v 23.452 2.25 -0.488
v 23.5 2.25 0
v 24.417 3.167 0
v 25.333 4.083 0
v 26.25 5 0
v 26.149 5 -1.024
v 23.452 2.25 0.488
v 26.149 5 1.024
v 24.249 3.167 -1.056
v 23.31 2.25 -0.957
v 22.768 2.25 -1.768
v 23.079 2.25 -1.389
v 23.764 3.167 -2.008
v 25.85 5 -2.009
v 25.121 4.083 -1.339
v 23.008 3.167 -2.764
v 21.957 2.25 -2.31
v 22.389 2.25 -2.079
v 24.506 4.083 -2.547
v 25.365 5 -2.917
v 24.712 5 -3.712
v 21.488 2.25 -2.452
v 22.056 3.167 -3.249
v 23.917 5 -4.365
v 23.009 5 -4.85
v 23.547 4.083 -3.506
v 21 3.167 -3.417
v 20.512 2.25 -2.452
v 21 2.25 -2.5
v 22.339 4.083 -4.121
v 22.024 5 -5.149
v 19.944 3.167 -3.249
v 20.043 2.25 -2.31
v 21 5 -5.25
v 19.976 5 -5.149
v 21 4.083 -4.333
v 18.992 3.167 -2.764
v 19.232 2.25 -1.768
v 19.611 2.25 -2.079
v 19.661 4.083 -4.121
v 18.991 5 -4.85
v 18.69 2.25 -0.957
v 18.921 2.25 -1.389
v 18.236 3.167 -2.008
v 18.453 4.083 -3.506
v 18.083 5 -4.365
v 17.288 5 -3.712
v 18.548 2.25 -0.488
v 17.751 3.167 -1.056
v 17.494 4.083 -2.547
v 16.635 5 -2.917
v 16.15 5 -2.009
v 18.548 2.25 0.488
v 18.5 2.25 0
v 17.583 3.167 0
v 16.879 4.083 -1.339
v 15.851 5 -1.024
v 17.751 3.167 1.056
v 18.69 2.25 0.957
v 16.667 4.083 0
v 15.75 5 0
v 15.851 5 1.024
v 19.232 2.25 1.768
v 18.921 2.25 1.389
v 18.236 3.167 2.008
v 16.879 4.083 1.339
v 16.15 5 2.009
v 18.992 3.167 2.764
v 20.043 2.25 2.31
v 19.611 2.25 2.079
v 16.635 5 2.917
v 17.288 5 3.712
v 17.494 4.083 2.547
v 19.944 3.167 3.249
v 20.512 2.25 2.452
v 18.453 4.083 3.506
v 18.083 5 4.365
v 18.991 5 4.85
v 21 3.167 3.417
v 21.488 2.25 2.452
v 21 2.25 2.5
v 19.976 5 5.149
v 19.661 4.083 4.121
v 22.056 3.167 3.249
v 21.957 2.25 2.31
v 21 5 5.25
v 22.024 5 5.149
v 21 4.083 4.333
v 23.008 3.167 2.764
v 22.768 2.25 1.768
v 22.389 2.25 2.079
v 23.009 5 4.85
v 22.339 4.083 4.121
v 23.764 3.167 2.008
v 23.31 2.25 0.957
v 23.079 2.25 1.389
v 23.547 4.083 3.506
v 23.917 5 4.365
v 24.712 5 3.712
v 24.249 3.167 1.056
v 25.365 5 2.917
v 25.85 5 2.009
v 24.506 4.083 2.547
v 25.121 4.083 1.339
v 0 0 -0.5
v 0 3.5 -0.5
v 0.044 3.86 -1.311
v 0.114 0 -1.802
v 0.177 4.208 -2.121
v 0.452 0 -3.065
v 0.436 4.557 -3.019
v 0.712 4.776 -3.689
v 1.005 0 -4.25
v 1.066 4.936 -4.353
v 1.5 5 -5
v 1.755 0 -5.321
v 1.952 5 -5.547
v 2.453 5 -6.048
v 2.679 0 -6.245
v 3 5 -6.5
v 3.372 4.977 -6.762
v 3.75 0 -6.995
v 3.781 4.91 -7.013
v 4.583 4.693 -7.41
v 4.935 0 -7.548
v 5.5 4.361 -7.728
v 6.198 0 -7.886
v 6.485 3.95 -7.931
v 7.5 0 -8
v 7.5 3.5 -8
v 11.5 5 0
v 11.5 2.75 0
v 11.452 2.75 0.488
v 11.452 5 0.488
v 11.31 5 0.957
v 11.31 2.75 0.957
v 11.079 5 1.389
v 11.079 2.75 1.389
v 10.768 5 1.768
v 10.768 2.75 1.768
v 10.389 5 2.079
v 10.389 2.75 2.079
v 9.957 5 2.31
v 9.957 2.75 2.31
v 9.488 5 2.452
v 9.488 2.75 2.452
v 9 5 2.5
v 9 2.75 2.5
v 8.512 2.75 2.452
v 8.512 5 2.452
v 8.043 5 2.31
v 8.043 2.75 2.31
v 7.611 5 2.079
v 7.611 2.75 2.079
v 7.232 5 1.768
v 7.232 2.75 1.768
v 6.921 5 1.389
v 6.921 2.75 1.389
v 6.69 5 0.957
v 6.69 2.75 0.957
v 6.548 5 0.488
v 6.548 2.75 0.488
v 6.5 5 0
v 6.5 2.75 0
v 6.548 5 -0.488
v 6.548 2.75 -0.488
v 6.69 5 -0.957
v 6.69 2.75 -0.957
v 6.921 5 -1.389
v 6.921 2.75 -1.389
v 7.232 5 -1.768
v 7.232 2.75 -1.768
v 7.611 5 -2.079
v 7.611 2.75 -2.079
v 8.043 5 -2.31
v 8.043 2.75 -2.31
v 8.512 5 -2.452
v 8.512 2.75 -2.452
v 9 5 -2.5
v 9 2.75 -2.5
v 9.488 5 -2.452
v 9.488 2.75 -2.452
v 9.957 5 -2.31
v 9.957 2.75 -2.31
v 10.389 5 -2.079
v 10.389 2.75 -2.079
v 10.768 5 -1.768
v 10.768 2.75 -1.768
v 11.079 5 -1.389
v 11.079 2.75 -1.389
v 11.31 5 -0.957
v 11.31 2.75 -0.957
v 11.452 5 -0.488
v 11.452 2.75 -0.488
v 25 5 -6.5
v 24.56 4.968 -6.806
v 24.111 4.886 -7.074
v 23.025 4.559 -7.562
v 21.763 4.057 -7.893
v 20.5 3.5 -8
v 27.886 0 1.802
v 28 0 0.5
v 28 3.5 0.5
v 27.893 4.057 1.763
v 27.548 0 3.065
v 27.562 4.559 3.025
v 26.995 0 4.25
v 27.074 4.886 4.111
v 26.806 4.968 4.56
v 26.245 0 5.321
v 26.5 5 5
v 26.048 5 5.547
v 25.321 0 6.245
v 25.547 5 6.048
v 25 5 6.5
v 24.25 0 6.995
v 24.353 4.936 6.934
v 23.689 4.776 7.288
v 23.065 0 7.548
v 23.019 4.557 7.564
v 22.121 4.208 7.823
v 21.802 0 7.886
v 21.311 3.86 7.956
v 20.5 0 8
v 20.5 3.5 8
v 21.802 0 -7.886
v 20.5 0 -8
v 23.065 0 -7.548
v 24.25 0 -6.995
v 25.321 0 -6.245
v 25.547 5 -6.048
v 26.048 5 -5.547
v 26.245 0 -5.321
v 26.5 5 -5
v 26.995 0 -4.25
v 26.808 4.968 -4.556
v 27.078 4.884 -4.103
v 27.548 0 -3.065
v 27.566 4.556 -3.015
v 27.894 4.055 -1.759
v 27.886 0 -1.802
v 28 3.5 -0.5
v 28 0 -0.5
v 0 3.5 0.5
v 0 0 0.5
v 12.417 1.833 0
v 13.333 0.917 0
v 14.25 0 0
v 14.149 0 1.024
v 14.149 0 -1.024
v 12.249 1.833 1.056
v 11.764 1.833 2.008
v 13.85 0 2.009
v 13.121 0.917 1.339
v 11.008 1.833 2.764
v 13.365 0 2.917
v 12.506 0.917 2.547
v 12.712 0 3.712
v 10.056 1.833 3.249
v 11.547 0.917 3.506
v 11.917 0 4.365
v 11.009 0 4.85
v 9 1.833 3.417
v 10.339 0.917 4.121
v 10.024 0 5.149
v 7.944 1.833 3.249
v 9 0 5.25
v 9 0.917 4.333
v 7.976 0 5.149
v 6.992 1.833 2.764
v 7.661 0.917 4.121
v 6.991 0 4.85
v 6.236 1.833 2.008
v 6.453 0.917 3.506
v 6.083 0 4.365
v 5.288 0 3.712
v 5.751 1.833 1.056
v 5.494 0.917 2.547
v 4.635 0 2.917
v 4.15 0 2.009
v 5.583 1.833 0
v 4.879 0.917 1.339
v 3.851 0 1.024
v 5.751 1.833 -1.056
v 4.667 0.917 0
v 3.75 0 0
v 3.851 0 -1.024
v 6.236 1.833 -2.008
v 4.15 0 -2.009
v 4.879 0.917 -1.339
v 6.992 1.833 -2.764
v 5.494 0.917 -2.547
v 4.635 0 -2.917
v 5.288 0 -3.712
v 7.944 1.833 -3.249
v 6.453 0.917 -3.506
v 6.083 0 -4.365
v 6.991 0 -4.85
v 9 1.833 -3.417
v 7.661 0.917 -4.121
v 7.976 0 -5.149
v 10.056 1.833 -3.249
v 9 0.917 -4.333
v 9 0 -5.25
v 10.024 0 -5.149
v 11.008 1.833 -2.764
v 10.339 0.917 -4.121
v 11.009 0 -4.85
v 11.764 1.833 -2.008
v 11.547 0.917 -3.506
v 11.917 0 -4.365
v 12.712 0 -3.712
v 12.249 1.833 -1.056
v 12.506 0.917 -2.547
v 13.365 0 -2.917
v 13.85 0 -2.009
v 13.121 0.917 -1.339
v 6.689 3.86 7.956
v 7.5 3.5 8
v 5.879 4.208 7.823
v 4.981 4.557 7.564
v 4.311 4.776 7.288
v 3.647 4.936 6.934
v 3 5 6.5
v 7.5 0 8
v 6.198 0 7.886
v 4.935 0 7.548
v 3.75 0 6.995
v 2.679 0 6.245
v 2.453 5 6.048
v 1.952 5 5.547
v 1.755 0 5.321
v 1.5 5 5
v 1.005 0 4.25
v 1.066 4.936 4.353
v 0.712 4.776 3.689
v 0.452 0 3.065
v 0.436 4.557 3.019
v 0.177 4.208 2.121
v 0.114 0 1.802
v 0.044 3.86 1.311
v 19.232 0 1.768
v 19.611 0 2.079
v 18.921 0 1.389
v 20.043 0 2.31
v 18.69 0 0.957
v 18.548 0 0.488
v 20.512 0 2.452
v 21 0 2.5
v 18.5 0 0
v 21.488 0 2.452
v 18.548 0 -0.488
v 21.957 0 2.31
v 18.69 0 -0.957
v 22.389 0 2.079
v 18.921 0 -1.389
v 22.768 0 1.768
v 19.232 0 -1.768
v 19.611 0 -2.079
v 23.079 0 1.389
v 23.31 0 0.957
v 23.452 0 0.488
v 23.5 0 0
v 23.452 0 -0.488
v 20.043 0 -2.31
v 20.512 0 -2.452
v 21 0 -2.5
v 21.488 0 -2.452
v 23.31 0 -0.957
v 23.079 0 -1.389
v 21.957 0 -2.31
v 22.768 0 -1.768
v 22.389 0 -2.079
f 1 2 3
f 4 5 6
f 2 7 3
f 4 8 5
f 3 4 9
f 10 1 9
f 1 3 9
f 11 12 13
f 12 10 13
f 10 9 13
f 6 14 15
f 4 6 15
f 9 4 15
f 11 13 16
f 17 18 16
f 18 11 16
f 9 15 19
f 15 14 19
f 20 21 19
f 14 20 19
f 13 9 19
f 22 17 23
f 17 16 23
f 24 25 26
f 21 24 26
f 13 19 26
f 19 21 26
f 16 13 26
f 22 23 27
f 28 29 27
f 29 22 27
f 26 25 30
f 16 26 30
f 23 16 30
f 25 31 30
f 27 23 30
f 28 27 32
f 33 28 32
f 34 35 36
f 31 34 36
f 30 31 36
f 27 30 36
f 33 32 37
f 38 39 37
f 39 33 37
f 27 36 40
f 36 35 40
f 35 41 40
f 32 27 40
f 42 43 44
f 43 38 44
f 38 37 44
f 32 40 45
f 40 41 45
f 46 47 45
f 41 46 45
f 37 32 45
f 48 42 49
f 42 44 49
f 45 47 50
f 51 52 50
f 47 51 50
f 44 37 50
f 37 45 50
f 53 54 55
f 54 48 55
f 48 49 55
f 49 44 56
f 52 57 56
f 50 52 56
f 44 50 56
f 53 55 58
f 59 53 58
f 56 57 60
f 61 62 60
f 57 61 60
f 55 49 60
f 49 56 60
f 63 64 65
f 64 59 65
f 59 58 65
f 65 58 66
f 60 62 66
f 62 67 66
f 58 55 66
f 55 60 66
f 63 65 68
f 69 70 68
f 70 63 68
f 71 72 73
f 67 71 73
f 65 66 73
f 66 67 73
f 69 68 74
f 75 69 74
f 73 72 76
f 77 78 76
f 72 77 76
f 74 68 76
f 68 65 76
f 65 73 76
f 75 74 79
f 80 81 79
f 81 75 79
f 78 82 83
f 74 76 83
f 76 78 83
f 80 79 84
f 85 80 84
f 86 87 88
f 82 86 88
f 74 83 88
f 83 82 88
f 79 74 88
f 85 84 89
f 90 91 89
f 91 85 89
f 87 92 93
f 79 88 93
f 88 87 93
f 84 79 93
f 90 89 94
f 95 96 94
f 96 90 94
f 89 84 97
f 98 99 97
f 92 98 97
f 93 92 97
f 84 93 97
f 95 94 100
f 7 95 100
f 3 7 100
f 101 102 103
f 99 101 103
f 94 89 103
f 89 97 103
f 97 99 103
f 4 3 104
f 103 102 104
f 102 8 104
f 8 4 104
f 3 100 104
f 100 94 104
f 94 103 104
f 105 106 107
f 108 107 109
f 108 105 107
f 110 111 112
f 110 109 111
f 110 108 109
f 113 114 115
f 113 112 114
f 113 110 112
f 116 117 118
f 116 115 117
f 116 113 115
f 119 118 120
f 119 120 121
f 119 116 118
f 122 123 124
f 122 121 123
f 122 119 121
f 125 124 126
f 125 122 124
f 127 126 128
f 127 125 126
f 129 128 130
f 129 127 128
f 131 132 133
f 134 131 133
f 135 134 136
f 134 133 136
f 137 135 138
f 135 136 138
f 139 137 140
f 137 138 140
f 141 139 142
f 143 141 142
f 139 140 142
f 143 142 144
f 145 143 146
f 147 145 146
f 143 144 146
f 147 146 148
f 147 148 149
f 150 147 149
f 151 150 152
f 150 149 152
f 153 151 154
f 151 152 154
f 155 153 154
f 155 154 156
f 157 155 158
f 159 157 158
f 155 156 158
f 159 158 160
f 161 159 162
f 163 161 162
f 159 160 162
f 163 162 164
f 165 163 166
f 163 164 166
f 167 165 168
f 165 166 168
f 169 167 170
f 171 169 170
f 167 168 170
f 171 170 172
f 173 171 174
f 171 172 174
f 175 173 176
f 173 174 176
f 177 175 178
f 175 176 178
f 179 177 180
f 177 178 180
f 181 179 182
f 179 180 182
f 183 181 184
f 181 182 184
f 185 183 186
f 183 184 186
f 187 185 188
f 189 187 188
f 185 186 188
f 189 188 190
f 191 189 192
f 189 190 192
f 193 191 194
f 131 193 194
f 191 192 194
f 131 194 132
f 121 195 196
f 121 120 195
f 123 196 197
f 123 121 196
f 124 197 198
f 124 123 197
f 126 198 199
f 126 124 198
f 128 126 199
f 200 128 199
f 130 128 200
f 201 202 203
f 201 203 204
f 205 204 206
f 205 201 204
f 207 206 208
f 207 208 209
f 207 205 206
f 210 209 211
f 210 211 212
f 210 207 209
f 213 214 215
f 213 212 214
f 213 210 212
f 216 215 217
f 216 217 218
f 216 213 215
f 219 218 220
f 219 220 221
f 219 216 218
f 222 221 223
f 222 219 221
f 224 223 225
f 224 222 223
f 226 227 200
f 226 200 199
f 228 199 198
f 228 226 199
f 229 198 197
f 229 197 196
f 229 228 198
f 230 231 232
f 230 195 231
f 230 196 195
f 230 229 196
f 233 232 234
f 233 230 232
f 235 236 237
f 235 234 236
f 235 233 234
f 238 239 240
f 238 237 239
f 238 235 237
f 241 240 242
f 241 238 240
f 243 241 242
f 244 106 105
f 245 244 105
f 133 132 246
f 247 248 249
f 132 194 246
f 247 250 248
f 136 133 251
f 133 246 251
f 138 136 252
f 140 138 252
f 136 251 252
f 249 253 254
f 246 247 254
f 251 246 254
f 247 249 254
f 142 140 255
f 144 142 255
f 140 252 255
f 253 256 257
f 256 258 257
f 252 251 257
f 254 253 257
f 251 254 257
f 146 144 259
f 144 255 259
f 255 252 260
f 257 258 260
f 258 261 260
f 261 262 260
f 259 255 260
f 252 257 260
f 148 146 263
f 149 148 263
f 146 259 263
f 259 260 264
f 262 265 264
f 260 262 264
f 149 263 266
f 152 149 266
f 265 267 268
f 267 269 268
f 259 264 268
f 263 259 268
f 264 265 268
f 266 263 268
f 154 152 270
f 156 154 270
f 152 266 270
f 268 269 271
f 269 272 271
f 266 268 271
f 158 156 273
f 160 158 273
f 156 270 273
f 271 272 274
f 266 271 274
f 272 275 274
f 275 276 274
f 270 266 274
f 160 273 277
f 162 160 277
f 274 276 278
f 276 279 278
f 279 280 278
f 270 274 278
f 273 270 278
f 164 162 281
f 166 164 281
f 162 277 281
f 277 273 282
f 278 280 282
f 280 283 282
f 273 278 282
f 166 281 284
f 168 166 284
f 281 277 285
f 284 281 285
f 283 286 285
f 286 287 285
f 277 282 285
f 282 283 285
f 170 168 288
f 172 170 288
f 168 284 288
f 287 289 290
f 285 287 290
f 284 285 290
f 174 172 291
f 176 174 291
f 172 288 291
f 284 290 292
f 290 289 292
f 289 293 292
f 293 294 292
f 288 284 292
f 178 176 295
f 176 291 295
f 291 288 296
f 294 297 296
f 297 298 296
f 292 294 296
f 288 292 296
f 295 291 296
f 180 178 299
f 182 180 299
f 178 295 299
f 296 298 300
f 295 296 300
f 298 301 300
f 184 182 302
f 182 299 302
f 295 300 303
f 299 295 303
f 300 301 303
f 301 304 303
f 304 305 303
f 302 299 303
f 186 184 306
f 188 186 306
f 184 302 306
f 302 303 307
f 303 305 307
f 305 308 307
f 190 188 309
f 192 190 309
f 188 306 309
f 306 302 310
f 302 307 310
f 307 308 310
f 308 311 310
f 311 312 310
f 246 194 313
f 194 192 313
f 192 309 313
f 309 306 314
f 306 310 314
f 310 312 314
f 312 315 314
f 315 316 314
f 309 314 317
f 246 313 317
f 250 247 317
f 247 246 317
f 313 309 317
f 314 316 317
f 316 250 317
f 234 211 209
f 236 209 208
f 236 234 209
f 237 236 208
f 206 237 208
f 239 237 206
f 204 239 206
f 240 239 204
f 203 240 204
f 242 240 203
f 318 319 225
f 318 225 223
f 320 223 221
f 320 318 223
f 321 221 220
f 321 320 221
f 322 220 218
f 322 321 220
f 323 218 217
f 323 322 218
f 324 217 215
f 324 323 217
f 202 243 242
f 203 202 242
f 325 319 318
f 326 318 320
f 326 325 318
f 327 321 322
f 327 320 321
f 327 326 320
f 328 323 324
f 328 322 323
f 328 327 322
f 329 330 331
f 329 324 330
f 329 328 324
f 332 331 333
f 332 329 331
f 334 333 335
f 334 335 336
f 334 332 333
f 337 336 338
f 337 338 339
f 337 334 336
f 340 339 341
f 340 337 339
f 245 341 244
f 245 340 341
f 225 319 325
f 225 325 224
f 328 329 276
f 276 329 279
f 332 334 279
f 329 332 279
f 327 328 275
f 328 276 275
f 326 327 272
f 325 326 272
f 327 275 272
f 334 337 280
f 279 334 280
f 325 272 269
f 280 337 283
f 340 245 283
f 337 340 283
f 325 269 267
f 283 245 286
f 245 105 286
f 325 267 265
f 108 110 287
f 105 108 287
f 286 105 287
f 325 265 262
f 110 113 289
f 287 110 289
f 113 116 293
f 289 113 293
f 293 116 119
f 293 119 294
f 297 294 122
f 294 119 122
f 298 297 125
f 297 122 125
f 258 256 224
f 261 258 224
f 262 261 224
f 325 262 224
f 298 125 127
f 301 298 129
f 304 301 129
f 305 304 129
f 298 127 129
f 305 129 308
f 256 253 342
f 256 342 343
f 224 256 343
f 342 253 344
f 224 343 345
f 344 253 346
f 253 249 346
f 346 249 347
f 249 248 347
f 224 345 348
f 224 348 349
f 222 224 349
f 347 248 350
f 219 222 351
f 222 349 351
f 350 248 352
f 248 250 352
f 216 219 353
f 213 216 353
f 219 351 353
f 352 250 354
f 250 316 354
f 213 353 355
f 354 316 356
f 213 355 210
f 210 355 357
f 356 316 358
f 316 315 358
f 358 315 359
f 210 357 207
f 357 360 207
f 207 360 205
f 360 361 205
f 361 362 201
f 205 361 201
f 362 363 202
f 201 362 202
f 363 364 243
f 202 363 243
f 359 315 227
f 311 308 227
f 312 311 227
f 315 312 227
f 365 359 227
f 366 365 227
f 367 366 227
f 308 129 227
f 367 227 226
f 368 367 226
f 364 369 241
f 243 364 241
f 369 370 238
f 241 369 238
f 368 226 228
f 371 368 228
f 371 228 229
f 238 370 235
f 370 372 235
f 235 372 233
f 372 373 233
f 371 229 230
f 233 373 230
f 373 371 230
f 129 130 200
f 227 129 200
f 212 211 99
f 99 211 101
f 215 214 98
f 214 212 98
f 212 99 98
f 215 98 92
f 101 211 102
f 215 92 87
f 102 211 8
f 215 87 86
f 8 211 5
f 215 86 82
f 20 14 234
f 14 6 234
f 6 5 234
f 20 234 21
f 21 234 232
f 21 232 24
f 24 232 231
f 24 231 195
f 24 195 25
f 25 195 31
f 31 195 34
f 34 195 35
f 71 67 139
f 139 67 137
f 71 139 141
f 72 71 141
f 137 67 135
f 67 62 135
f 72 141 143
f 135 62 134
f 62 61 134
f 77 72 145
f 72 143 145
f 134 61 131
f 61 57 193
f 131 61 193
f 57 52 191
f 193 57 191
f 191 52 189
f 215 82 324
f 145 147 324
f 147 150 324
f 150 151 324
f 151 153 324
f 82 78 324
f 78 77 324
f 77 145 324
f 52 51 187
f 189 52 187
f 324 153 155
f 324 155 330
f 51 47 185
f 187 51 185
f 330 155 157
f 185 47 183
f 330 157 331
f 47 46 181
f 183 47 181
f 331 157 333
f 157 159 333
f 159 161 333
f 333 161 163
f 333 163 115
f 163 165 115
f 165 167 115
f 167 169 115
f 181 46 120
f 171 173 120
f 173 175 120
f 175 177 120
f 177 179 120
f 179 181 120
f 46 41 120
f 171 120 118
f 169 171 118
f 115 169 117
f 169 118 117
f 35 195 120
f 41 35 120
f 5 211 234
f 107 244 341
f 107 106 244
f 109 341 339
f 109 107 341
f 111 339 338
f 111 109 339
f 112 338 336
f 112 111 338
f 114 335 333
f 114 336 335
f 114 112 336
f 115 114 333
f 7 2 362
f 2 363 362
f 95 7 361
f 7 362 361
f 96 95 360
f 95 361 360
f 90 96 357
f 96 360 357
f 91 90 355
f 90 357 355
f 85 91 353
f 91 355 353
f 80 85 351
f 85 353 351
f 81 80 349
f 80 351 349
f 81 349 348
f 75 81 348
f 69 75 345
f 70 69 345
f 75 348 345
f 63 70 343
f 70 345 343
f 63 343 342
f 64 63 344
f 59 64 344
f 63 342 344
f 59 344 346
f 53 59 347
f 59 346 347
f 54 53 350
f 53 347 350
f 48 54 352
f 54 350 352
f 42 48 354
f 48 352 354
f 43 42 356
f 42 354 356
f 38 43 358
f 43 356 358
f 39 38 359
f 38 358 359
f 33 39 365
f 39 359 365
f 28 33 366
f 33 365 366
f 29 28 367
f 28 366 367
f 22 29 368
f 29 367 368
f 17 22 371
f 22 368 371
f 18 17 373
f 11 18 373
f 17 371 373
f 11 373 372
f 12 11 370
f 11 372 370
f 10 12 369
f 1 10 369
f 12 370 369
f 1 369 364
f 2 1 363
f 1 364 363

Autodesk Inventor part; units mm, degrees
sketch "Sketch_1" plane through (0, 0, 0) normal (0, 0, 1) x (1, 0, 0)
  line L0 (0, 0) -> (28, 0)
  line L1 (28, 0) -> (28, 3.5)
  arc A0 (28, 3.5) -> (26.5, 5) centre (26.5, 3.5) ccw
  line L2 (26.5, 5) -> (1.5, 5)
  arc A1 (1.5, 5) -> (0, 3.5) centre (1.5, 3.5) ccw
  line L3 (0, 3.5) -> (0, 0)
extrude "Extrusion1" add sketch "Sketch_1" along normal mid plane 16
sketch "Sketch_2" plane through (0, 0, 0) normal (1, 0, 0) x (0, 1, 0)
  line L0 (14.3017, 20.7284) -> (-9.9569, 20.7284)
  line L1 (-9.9569, 20.7284) -> (-9.9569, -18.375)
  line L2 (-9.9569, -18.375) -> (14.3017, -18.375)
  line L3 (14.3017, -18.375) -> (14.3017, 20.7284)
  line L4 (0, 8) -> (0, -8)
  line L5 (0, -8) -> (3.5, -8)
  arc A0 (3.5, -8) -> (5, -6.5) centre (3.5, -6.5) ccw
  line L6 (5, -6.5) -> (5, 6.5)
  arc A1 (5, 6.5) -> (3.5, 8) centre (3.5, 6.5) ccw
  line L7 (3.5, 8) -> (0, 8)
extrude "Extrusion2" cut sketch "Sketch_2" along normal blind 28
sketch "Sketch_3" plane through (0, 0, 0) normal (0, 0, 1) x (1, 0, 0)
  line L0 (21, 0) -> (21, 5)
  line L1 (21, 5) -> (26.25, 5)
  line L2 (26.25, 5) -> (23.5, 2.25)
  line L3 (23.5, 2.25) -> (23.5, 0)
  line L4 (23.5, 0) -> (21, 0)
  line L5 (21, 0) -> (21, 5)
revolve "Revolution1" cut sketch "Sketch_3" angle 360 about axis through (21, 0, 0) along (0, -1, 0)
sketch "Sketch_4" plane through (0, 0, 0) normal (0, 0, 1) x (1, 0, 0)
  line L0 (9, 0) -> (9, 5)
  line L1 (9, 5) -> (11.5, 5)
  line L2 (11.5, 5) -> (11.5, 2.75)
  line L3 (11.5, 2.75) -> (14.25, 0)
  line L4 (14.25, 0) -> (9, 0)
  line L5 (9, 0) -> (9, 5)
revolve "Revolution2" cut sketch "Sketch_4" angle 360 about axis through (9, 0, 0) along (0, -1, 0)
sketch "Sketch_7" plane through (0, 0, 0) normal (0, 1, 0) x (-1, 0, 0)
  line L0 (14, -16) -> (14, 16)
  line L1 (14, 16) -> (-34, 16)
  line L2 (-34, 16) -> (-34, -16)
  line L3 (-34, -16) -> (14, -16)
  arc A0 (0, 0.5) -> (-7.5, 8) centre (-7.5, 0.5) ccw
  line L4 (-7.5, 8) -> (-20.5, 8)
  arc A1 (-20.5, 8) -> (-28, 0.5) centre (-20.5, 0.5) ccw
  line L5 (-28, 0.5) -> (-28, -0.5)
  arc A2 (-28, -0.5) -> (-20.5, -8) centre (-20.5, -0.5) ccw
  line L6 (-20.5, -8) -> (-7.5, -8)
  arc A3 (-7.5, -8) -> (0, -0.5) centre (-7.5, -0.5) ccw
  line L7 (0, -0.5) -> (0, 0.5)
extrude "Extrusion3" cut sketch "Sketch_7" along normal blind 5
ref_plane "frame_bolt_XY" through (21, 2.25, 0) normal (0, 1, 0) x (1, 0, 0)
ref_plane "frame_bolt_YZ" through (21, 2.25, 0) normal (1, 0, 0) x (0, 0, -1)
ref_plane "frame_bolt_ZX" through (21, 2.25, 0) normal (0, 0, -1) x (0, 1, 0)
ref_plane "pull_bolt_XY" through (9, 2.75, 0) normal (0, -1, 0) x (1, 0, 0)
ref_plane "pull_bolt_YZ" through (9, 2.75, 0) normal (1, 0, 0) x (0, 0, 1)
ref_plane "pull_bolt_ZX" through (9, 2.75, 0) normal (0, 0, 1) x (0, -1, 0)
properties part number "UWANGFplate"
